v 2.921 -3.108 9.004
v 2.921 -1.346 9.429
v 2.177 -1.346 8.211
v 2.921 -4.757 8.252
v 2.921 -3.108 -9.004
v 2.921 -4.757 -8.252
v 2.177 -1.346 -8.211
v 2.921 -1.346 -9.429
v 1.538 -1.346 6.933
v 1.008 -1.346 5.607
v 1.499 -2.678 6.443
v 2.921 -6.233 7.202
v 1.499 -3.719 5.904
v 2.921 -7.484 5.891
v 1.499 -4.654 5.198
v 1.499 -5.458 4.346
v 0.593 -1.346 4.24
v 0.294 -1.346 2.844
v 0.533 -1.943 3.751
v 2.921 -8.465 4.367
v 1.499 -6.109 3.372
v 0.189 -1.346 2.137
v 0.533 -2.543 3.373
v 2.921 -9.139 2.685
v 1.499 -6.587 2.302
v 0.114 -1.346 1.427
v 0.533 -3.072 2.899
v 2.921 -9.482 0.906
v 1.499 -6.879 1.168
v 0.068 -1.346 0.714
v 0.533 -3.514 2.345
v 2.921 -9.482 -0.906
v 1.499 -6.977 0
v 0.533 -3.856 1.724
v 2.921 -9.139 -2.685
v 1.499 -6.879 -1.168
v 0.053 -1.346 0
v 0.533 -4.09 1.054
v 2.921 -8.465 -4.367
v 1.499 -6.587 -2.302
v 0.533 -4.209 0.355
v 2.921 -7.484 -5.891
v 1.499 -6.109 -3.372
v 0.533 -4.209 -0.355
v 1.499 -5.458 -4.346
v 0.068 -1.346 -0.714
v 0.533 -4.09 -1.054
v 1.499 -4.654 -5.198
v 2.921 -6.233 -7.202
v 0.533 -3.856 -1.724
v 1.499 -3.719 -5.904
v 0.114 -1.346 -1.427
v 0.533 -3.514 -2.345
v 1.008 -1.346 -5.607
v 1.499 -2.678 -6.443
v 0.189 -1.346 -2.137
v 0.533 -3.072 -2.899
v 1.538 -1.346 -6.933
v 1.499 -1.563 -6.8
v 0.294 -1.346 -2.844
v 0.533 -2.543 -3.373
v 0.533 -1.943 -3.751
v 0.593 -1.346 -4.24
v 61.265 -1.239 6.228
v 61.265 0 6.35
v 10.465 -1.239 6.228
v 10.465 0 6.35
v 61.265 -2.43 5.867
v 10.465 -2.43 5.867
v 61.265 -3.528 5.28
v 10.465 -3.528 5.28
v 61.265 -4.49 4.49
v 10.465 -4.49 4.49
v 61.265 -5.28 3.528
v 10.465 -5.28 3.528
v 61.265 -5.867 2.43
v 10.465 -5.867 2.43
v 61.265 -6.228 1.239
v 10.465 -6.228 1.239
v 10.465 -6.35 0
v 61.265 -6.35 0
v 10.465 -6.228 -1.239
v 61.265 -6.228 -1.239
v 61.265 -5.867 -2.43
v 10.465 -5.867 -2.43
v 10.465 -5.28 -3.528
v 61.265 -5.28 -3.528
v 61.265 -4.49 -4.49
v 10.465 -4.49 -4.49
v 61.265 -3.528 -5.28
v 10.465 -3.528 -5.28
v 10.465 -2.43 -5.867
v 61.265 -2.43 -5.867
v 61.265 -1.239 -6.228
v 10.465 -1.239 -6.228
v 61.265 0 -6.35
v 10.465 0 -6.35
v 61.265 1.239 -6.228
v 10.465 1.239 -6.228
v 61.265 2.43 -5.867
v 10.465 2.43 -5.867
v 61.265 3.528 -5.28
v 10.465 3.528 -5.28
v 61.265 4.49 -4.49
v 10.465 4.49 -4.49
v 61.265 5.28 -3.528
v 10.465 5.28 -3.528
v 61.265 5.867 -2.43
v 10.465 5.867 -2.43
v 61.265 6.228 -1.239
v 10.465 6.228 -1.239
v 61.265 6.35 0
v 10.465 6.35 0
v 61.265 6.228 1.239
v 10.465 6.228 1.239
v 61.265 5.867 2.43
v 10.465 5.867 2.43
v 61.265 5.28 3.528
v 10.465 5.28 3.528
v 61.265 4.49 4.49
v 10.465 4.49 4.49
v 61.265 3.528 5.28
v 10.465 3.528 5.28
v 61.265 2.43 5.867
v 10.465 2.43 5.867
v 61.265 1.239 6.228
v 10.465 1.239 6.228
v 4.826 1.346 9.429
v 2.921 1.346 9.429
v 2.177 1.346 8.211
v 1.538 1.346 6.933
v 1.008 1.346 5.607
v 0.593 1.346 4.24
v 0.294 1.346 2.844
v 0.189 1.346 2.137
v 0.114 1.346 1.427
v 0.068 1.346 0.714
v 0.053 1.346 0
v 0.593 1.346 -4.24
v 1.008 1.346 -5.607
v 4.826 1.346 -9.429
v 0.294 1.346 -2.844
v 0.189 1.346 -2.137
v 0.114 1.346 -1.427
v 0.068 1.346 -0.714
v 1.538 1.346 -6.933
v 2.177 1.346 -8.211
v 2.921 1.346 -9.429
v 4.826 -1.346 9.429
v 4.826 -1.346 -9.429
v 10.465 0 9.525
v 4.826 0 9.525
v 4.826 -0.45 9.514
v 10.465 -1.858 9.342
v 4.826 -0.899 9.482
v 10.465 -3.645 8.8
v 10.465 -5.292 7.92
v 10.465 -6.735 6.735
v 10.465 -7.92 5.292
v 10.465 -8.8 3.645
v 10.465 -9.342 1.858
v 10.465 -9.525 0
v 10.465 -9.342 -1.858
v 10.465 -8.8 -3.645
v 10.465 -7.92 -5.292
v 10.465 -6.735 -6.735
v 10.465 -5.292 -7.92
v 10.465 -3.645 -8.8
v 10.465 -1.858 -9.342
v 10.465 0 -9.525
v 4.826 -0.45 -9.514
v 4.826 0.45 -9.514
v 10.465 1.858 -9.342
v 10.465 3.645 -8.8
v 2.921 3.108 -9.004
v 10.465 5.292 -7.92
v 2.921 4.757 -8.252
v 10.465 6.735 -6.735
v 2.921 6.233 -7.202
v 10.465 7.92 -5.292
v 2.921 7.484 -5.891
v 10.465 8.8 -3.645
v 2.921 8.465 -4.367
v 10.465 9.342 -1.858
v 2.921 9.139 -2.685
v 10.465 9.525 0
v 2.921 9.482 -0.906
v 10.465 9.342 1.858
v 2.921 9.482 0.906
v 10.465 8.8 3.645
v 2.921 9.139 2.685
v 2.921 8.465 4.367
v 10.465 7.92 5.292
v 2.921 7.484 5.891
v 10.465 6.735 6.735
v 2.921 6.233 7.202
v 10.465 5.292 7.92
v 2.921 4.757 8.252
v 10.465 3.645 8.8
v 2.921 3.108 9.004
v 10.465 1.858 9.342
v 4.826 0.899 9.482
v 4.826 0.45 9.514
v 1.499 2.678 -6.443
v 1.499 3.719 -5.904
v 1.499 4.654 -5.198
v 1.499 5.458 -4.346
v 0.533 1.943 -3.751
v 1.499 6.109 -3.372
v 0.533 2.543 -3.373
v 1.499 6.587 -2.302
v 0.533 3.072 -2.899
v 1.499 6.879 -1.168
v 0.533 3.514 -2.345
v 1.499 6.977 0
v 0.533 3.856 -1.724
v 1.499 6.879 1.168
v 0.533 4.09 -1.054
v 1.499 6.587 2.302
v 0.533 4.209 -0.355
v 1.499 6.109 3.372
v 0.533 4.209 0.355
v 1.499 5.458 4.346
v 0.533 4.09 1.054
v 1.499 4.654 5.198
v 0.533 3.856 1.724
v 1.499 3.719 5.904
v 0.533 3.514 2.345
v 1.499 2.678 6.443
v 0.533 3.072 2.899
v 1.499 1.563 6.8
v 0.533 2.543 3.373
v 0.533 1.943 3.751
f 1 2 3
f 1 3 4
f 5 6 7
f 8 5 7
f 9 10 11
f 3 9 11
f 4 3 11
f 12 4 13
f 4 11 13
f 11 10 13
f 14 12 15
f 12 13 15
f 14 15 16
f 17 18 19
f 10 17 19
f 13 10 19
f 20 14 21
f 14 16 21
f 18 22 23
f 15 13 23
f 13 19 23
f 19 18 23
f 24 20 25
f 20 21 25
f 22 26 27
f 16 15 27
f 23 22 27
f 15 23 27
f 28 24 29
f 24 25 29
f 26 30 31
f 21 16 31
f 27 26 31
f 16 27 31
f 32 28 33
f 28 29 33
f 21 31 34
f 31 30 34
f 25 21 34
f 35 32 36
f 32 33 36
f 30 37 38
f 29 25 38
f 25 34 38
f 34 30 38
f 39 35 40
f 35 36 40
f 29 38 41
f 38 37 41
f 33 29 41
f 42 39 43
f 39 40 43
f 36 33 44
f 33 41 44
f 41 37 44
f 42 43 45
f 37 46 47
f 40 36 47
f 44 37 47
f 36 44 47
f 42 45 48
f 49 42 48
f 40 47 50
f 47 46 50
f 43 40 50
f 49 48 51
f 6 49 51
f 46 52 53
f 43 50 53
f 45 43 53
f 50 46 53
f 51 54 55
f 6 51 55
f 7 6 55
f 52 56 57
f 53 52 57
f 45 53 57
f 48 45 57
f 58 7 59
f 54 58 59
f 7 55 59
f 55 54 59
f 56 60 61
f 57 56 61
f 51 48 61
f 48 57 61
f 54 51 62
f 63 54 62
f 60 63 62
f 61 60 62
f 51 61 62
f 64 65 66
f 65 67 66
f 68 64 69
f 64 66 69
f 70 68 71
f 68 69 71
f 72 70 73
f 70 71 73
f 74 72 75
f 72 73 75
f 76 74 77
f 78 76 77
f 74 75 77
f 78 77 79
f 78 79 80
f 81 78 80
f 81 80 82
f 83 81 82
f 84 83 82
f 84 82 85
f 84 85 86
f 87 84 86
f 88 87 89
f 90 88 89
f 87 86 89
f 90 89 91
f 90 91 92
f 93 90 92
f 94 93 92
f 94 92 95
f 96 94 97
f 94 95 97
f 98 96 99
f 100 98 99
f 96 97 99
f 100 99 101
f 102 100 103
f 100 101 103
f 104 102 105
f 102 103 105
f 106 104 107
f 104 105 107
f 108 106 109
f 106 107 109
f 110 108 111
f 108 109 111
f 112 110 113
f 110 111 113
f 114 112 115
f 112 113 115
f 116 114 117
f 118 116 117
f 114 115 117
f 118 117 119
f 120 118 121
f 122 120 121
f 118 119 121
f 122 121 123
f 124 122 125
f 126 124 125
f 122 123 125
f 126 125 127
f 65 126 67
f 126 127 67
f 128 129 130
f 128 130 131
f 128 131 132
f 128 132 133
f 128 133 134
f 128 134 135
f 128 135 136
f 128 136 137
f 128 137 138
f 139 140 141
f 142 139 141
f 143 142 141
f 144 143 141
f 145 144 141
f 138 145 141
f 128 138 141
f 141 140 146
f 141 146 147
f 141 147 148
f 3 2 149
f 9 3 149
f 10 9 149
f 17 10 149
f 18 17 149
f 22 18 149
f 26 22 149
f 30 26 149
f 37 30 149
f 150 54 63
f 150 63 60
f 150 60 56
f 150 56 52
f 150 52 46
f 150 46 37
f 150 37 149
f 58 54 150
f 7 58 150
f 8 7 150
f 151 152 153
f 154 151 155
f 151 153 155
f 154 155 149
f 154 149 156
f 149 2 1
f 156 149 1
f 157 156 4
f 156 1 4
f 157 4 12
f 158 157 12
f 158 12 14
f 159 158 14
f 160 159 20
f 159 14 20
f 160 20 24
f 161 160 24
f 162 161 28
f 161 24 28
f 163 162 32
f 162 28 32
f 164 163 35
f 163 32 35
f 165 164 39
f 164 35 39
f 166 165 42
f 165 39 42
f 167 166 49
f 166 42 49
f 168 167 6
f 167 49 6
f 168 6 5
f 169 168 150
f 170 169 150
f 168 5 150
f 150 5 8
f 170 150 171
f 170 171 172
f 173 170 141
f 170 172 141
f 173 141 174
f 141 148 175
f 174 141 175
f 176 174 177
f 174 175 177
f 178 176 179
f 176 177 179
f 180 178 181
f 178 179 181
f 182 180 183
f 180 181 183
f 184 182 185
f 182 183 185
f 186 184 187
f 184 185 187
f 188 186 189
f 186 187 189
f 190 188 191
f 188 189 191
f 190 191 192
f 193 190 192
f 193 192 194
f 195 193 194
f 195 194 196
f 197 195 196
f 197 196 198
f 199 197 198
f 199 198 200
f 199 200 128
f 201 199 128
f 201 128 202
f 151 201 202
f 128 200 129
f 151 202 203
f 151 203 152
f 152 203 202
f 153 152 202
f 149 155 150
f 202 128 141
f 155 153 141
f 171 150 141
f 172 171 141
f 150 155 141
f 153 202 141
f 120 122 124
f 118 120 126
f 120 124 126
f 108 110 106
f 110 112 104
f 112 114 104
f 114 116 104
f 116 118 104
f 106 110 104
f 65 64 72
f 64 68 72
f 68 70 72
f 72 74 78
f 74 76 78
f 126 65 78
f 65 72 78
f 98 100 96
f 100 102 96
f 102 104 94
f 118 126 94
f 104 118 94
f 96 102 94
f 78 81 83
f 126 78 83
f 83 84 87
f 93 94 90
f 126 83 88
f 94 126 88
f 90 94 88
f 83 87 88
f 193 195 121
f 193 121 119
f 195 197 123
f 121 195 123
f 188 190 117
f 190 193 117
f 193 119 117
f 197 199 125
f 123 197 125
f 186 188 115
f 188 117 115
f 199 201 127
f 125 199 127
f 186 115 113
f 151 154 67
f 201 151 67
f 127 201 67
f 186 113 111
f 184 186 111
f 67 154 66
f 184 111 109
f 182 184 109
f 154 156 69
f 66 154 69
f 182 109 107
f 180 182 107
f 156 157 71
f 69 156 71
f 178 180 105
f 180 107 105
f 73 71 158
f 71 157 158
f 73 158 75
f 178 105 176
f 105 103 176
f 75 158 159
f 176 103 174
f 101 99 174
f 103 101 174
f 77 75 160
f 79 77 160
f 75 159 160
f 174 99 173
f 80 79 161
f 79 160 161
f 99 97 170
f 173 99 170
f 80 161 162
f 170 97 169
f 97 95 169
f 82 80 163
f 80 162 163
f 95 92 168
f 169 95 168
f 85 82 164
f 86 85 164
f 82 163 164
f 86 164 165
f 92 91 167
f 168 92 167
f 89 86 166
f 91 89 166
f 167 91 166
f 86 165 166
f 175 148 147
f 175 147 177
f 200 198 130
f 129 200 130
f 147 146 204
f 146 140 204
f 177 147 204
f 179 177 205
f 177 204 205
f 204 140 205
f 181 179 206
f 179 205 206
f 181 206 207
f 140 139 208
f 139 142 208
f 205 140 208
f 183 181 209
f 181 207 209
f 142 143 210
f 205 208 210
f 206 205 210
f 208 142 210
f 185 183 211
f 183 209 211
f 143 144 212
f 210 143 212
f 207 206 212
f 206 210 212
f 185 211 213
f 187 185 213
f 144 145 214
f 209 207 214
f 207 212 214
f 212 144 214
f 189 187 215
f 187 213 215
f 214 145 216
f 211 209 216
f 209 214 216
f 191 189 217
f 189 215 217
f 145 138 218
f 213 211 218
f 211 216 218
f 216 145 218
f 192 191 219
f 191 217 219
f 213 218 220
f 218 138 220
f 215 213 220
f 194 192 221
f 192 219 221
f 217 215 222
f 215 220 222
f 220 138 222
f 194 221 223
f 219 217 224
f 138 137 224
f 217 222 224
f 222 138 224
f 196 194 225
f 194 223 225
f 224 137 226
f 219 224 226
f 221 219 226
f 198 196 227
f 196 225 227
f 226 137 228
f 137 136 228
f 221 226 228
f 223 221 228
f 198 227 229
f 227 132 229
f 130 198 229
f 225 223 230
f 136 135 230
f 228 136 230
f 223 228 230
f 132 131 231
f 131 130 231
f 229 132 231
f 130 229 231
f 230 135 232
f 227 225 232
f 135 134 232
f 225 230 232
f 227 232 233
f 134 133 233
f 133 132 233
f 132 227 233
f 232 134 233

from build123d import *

# Parameters (mm, degrees)
SKETCH2_W  = 19.05
SKETCH2_H  = 2.6924
SLOT_DEPTH = 4.826


with BuildPart() as part:
    # BodySke → Base-Revolve (revolve)
    with BuildSketch(Plane.XY, mode=Mode.PRIVATE) as base_revolve_sk:
        with BuildLine():
            Line((10.4648, 6.35), (10.4648, 9.525))
            Line((10.4648, 9.525), (2.921, 9.525))
            ThreePointArc((2.921, 9.525), (0.746656199, 4.981412099), (0, 0))
            Line((0, 0), (61.2648, 0))
            Line((61.2648, 0), (61.2648, 6.35))
            Line((61.2648, 6.35), (10.4648, 6.35))
        make_face()
    revolve(base_revolve_sk.sketch.rotate(Axis((-25.4, 0, 0), (1, 0, 0)), 90), axis=Axis((-25.4, 0, 0), (1, 0, 0)))

    # Sketch2 → Slot (cut)
    with BuildSketch(Plane(origin=(0, 0, 0), x_dir=(0, 0, -1), z_dir=(1, 0, 0))):
        Rectangle(SKETCH2_W, SKETCH2_H)
    extrude(amount=SLOT_DEPTH, mode=Mode.SUBTRACT)


solid = part.part
